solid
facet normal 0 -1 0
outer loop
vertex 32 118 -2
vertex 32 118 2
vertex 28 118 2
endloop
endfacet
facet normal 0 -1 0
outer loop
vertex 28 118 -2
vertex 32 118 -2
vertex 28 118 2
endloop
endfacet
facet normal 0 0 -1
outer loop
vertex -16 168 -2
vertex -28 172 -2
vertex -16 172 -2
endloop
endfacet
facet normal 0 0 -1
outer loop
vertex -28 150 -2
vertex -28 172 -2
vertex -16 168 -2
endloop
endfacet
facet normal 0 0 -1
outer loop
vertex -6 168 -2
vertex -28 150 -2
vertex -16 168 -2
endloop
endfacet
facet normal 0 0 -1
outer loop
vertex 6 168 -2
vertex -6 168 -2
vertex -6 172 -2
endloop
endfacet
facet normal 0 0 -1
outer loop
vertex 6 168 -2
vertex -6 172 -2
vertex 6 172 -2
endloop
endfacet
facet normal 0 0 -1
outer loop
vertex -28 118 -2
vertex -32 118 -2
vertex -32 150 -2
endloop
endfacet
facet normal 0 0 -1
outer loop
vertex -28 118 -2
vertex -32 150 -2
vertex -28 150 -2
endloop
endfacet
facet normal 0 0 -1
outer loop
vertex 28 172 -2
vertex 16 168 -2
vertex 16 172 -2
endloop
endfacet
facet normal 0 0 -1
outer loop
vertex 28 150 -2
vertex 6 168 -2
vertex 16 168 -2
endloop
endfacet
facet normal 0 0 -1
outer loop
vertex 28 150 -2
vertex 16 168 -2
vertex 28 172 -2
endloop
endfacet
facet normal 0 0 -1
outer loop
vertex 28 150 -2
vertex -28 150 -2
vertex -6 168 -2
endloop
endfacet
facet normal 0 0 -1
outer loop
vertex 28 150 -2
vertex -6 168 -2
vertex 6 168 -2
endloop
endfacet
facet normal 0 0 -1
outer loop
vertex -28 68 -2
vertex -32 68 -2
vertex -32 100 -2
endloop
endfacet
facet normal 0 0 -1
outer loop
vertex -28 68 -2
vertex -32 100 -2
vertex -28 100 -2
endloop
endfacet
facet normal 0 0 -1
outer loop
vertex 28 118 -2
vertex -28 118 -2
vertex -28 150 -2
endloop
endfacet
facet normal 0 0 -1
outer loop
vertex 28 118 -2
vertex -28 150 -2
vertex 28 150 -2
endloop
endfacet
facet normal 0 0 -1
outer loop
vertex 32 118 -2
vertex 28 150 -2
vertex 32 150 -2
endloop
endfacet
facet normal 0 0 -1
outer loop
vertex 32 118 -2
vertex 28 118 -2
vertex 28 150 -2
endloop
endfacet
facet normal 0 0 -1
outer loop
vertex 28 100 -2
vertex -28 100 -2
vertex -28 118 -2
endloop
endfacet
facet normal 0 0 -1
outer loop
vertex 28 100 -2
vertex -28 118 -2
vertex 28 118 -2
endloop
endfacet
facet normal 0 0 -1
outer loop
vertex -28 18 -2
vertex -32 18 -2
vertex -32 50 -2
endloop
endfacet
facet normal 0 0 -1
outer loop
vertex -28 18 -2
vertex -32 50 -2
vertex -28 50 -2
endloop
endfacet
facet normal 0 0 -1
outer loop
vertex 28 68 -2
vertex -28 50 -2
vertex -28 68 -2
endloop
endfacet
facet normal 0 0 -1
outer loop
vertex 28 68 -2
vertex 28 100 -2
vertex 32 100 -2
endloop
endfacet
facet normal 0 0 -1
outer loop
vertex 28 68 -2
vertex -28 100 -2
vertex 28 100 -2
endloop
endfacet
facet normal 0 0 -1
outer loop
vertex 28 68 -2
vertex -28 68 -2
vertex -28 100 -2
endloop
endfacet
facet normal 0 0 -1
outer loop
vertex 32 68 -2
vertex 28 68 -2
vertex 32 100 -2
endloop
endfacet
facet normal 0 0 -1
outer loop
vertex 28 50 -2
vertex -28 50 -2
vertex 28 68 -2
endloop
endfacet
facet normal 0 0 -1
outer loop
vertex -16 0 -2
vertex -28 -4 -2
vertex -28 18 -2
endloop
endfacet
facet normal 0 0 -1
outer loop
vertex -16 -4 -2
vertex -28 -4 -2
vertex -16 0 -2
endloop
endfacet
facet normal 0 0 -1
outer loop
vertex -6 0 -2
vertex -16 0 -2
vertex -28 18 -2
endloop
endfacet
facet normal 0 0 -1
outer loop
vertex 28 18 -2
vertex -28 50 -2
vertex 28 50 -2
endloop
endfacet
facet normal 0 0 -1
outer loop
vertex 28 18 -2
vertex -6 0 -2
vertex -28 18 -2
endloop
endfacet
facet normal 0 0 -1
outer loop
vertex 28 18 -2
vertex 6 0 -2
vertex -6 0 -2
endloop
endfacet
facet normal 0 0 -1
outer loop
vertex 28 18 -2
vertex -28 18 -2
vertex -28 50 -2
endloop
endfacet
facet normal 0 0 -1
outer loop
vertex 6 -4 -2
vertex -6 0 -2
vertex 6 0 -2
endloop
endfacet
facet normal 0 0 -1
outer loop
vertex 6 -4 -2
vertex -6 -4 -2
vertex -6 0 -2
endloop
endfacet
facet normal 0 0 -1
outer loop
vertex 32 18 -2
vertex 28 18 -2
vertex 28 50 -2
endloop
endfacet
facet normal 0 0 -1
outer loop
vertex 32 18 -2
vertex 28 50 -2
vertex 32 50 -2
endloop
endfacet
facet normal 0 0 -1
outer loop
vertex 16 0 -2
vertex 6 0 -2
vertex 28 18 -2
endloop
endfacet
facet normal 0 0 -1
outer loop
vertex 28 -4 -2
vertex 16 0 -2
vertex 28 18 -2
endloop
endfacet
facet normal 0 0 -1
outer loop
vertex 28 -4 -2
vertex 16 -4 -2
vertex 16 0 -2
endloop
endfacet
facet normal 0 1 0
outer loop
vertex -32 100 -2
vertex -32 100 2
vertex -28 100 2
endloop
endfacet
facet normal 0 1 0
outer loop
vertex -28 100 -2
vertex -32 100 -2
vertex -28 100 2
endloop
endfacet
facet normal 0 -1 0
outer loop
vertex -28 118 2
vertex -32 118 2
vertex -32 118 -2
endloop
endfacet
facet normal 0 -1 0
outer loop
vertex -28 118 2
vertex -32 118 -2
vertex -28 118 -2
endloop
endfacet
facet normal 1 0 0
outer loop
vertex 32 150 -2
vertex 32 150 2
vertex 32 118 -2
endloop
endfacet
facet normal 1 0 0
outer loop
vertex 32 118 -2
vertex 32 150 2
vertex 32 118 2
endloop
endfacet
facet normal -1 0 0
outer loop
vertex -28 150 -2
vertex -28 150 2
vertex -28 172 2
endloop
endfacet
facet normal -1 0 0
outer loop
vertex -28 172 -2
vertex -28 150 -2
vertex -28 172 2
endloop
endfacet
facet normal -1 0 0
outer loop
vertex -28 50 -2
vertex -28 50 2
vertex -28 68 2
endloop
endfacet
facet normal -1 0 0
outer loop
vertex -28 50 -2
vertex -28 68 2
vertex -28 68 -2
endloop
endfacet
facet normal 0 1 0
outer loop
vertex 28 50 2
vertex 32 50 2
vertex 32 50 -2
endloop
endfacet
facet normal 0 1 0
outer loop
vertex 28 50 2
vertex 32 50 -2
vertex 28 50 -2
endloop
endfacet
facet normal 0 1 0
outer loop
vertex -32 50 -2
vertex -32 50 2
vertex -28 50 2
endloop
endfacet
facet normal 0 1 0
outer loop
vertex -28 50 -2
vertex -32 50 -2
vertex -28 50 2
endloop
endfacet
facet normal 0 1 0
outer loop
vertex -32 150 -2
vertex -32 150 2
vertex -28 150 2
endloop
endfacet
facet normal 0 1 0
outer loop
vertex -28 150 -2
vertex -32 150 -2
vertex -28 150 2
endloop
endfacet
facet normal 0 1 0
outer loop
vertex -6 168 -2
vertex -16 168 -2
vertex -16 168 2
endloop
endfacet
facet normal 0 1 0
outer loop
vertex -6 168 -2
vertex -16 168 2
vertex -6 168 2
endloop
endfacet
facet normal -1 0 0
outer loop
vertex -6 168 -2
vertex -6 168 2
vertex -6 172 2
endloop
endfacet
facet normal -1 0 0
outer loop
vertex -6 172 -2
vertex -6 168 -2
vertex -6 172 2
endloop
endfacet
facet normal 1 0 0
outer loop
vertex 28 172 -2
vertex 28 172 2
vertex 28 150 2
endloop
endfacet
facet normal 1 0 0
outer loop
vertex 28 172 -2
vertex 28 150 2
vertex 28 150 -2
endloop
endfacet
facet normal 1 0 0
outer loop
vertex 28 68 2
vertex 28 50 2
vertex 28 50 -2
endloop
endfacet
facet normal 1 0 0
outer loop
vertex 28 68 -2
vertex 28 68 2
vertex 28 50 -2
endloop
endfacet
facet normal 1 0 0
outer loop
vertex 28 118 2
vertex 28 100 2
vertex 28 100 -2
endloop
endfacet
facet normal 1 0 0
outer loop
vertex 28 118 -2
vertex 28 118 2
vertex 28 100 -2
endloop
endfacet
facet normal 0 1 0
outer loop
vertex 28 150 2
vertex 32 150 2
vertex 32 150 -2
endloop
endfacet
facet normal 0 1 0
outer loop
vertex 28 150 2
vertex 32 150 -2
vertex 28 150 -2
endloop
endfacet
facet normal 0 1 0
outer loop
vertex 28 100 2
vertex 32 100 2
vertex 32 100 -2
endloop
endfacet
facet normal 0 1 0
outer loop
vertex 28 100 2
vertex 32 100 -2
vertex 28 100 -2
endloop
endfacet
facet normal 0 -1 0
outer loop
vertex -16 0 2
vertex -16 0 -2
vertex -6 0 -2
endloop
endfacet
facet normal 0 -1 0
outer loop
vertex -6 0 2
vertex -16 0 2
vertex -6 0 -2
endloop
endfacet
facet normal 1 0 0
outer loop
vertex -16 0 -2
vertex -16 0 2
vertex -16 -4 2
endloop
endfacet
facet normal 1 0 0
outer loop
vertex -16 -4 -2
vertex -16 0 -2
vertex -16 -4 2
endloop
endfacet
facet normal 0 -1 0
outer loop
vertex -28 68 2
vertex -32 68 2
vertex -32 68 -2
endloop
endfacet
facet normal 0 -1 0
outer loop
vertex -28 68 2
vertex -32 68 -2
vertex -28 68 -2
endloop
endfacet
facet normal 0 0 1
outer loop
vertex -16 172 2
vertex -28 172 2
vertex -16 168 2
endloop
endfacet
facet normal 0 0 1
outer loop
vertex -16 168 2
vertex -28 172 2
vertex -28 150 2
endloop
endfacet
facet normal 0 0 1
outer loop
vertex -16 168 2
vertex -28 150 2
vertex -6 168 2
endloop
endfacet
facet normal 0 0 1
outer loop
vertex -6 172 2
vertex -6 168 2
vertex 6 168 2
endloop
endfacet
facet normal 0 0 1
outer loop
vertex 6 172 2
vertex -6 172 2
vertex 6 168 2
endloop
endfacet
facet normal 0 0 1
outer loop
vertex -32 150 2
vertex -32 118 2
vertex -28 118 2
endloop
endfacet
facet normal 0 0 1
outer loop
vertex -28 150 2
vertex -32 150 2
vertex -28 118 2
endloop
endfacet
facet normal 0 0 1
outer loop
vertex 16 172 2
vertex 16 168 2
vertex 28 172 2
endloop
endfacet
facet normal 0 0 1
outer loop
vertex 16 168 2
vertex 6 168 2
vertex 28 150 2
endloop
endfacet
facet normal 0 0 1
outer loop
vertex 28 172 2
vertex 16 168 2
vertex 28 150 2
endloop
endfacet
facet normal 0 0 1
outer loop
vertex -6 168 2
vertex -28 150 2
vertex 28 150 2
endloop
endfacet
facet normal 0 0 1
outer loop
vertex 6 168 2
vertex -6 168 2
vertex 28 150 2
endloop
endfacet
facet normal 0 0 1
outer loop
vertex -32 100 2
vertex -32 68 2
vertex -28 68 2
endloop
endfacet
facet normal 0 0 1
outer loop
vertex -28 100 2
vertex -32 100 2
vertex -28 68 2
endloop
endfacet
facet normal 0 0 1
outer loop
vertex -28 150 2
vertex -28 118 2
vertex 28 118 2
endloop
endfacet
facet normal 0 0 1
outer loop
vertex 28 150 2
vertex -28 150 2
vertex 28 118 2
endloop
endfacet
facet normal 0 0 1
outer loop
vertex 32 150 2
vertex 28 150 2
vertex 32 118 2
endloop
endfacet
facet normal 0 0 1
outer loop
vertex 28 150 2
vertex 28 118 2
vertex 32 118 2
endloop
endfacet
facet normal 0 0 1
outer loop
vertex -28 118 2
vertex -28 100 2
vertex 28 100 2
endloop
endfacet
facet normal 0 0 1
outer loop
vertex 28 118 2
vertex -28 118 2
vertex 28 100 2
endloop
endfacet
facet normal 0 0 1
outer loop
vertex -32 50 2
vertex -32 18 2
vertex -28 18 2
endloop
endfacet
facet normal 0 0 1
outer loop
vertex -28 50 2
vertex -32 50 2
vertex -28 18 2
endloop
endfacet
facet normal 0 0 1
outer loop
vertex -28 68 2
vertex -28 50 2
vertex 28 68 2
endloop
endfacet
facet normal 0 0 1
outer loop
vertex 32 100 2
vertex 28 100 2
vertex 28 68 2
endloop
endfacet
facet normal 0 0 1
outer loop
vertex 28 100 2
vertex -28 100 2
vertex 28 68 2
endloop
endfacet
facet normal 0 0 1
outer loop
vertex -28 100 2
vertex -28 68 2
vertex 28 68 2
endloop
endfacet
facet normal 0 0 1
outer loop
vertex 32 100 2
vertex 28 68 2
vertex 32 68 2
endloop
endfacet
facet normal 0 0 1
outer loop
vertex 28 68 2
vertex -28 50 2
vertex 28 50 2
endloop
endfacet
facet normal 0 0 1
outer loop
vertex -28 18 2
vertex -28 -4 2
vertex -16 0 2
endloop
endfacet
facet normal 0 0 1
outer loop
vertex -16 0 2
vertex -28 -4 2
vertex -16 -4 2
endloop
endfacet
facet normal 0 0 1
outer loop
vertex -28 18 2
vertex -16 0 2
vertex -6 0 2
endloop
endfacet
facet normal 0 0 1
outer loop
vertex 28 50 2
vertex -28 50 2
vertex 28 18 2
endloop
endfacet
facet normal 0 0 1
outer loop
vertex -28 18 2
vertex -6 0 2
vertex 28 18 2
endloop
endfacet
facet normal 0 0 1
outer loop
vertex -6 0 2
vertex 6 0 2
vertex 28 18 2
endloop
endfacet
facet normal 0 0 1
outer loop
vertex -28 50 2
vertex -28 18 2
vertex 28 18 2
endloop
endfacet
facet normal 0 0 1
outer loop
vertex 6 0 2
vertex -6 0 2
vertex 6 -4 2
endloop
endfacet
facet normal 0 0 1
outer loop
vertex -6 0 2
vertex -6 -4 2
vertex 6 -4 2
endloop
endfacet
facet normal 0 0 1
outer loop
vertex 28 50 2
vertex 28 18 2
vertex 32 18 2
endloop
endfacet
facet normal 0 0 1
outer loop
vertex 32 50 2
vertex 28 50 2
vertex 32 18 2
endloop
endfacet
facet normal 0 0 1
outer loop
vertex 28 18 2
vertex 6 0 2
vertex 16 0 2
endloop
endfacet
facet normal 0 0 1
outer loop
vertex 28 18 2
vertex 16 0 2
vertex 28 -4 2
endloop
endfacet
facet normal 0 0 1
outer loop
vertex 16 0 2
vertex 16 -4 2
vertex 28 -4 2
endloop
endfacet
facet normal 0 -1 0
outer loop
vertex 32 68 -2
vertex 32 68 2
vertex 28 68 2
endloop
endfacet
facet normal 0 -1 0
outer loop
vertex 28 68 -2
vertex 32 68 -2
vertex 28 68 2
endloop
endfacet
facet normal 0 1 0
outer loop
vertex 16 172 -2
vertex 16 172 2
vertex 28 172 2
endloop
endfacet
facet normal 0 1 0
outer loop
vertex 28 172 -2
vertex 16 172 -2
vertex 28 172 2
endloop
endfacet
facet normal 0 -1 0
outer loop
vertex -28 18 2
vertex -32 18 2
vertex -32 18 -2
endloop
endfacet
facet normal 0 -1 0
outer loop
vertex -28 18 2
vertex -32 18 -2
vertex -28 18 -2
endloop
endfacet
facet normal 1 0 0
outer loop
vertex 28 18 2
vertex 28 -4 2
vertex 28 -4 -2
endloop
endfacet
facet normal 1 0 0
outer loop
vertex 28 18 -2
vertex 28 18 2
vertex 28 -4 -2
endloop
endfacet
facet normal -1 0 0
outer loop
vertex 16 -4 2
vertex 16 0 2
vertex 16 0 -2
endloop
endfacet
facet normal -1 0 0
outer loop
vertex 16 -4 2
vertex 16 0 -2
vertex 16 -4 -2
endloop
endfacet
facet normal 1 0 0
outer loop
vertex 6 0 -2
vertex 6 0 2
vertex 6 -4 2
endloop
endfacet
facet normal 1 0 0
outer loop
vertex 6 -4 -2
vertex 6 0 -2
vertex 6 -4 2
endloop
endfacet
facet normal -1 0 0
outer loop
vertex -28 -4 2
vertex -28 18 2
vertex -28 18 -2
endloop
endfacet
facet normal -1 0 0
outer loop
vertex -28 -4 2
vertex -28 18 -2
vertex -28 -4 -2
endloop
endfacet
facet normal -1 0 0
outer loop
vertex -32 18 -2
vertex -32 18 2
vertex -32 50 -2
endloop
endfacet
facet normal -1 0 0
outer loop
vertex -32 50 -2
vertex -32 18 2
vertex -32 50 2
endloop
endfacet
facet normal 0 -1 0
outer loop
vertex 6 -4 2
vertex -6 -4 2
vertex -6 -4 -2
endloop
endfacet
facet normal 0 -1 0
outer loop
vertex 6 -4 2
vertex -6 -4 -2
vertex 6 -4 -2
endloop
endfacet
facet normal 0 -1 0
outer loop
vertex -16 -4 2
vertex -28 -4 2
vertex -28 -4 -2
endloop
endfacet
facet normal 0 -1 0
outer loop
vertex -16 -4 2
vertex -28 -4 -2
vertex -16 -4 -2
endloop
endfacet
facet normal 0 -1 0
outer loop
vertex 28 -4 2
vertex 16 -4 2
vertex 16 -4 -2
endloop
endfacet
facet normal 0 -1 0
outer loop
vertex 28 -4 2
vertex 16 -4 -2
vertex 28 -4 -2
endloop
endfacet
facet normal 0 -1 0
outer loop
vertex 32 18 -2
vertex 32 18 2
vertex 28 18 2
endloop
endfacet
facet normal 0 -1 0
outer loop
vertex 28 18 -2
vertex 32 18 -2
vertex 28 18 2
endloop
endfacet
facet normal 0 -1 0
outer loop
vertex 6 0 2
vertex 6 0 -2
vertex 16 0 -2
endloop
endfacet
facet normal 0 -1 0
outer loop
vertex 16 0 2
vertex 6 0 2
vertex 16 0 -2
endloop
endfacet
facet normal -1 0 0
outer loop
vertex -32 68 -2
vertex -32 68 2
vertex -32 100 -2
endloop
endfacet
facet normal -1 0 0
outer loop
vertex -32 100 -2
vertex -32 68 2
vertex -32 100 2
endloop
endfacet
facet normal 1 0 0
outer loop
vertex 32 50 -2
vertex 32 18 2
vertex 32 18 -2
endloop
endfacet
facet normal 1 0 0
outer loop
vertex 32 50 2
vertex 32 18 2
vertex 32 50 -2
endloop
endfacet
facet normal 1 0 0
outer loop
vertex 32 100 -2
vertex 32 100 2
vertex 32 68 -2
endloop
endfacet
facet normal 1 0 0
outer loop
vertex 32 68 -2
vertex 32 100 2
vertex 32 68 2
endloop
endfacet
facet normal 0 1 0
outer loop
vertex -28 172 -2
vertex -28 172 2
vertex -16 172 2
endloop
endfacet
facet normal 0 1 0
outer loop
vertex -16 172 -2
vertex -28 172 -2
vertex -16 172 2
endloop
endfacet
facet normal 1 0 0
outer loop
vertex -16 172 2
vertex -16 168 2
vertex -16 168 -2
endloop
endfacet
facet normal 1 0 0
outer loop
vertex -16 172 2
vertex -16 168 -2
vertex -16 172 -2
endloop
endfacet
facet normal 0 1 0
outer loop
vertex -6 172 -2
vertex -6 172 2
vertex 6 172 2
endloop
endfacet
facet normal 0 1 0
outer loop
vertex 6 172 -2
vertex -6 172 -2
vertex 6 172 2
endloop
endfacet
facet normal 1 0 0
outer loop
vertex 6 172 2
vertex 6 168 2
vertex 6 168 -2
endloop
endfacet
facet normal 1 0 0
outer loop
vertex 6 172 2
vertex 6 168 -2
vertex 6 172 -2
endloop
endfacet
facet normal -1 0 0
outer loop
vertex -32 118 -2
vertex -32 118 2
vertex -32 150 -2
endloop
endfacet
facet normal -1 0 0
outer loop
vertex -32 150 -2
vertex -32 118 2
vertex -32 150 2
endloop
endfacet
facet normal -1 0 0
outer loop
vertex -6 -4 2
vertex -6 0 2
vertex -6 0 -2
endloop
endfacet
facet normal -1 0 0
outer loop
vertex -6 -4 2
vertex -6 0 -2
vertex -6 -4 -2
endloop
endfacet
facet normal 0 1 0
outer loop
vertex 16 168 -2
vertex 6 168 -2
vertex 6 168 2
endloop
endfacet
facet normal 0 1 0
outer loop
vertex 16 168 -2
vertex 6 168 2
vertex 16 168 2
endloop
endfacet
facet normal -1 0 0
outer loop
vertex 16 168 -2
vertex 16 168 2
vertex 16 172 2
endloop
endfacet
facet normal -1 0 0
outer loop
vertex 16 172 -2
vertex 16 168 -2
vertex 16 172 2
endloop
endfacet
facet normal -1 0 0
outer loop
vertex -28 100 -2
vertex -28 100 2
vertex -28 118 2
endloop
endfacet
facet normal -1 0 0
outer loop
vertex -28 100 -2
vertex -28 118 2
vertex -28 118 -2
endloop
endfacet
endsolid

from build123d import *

# Parameters (mm, degrees)
SKETCH1_W               = 56
SKETCH1_H               = 4
BOSS_EXTRUDE1_DEPTH     = 168
SKETCH3_W               = 4
SKETCH3_H               = 32
BOSS_EXTRUDE4_DEPTH     = 4
LPATTERN2_COUNT         = 3
LPATTERN2_PITCH         = 50
MIRROR2_COPY_1_SKETCH_W = 4
MIRROR2_COPY_1_SKETCH_H = 32
MIRROR2_COPY_1_DEPTH    = 4
MIRROR2_COPY_2_SKETCH_W = 4
MIRROR2_COPY_2_SKETCH_H = 32
MIRROR2_COPY_2_DEPTH    = 4
SKETCH4_W               = 12
SKETCH4_H               = 4
BOSS_EXTRUDE5_DEPTH     = 4


with BuildPart() as part:
    # Sketch1 → Boss-Extrude1 (new body)
    with BuildSketch(Plane(origin=(0, 0, 0), x_dir=(1, 0, 0), z_dir=(0, 1, 0))):
        Rectangle(SKETCH1_W, SKETCH1_H)
    extrude(amount=BOSS_EXTRUDE1_DEPTH)

    # Sketch3 → Boss-Extrude4 (add, through all)
    with BuildSketch(Plane.XY.offset(2)):
        with Locations((-30, 34)):
            Rectangle(SKETCH3_W, SKETCH3_H)
    boss_extrude4 = extrude(amount=-BOSS_EXTRUDE4_DEPTH)

    # LPattern2: Boss-Extrude4 ×3
    with Locations(*[(0, i * LPATTERN2_PITCH, 0) for i in range(1, LPATTERN2_COUNT)]):
        add(boss_extrude4)

    # Mirror2: Boss-Extrude4 across plane
    add(boss_extrude4.mirror(Plane(origin=(0, 0, 0), x_dir=(0, 0, 1), z_dir=(1, 0, 0))))

    # Mirror2 copy 1 sketch → Mirror2 copy 1 (add, through all)
    with BuildSketch(Plane(origin=(0, 50, 2), x_dir=(-1, 0, 0), z_dir=(0, 0, 1))):
        with Locations((-30, -34)):
            Rectangle(MIRROR2_COPY_1_SKETCH_W, MIRROR2_COPY_1_SKETCH_H)
    extrude(amount=-MIRROR2_COPY_1_DEPTH)

    # Mirror2 copy 2 sketch → Mirror2 copy 2 (add, through all)
    with BuildSketch(Plane(origin=(0, 100, 2), x_dir=(-1, 0, 0), z_dir=(0, 0, 1))):
        with Locations((-30, -34)):
            Rectangle(MIRROR2_COPY_2_SKETCH_W, MIRROR2_COPY_2_SKETCH_H)
    extrude(amount=-MIRROR2_COPY_2_DEPTH)

    # Sketch4 → Boss-Extrude5 (add, through all)
    with BuildSketch(Plane.XY.offset(2)):
        with Locations((-22, 170)):
            Rectangle(SKETCH4_W, SKETCH4_H)
        with Locations((0, 170)):
            Rectangle(SKETCH4_W, SKETCH4_H)
        with Locations((22, 170)):
            Rectangle(SKETCH4_W, SKETCH4_H)
    boss_extrude5 = extrude(amount=-BOSS_EXTRUDE5_DEPTH)

    # Mirror3: Boss-Extrude5 across plane
    add(boss_extrude5.mirror(Plane.ZX.offset(84)))


solid = part.part
